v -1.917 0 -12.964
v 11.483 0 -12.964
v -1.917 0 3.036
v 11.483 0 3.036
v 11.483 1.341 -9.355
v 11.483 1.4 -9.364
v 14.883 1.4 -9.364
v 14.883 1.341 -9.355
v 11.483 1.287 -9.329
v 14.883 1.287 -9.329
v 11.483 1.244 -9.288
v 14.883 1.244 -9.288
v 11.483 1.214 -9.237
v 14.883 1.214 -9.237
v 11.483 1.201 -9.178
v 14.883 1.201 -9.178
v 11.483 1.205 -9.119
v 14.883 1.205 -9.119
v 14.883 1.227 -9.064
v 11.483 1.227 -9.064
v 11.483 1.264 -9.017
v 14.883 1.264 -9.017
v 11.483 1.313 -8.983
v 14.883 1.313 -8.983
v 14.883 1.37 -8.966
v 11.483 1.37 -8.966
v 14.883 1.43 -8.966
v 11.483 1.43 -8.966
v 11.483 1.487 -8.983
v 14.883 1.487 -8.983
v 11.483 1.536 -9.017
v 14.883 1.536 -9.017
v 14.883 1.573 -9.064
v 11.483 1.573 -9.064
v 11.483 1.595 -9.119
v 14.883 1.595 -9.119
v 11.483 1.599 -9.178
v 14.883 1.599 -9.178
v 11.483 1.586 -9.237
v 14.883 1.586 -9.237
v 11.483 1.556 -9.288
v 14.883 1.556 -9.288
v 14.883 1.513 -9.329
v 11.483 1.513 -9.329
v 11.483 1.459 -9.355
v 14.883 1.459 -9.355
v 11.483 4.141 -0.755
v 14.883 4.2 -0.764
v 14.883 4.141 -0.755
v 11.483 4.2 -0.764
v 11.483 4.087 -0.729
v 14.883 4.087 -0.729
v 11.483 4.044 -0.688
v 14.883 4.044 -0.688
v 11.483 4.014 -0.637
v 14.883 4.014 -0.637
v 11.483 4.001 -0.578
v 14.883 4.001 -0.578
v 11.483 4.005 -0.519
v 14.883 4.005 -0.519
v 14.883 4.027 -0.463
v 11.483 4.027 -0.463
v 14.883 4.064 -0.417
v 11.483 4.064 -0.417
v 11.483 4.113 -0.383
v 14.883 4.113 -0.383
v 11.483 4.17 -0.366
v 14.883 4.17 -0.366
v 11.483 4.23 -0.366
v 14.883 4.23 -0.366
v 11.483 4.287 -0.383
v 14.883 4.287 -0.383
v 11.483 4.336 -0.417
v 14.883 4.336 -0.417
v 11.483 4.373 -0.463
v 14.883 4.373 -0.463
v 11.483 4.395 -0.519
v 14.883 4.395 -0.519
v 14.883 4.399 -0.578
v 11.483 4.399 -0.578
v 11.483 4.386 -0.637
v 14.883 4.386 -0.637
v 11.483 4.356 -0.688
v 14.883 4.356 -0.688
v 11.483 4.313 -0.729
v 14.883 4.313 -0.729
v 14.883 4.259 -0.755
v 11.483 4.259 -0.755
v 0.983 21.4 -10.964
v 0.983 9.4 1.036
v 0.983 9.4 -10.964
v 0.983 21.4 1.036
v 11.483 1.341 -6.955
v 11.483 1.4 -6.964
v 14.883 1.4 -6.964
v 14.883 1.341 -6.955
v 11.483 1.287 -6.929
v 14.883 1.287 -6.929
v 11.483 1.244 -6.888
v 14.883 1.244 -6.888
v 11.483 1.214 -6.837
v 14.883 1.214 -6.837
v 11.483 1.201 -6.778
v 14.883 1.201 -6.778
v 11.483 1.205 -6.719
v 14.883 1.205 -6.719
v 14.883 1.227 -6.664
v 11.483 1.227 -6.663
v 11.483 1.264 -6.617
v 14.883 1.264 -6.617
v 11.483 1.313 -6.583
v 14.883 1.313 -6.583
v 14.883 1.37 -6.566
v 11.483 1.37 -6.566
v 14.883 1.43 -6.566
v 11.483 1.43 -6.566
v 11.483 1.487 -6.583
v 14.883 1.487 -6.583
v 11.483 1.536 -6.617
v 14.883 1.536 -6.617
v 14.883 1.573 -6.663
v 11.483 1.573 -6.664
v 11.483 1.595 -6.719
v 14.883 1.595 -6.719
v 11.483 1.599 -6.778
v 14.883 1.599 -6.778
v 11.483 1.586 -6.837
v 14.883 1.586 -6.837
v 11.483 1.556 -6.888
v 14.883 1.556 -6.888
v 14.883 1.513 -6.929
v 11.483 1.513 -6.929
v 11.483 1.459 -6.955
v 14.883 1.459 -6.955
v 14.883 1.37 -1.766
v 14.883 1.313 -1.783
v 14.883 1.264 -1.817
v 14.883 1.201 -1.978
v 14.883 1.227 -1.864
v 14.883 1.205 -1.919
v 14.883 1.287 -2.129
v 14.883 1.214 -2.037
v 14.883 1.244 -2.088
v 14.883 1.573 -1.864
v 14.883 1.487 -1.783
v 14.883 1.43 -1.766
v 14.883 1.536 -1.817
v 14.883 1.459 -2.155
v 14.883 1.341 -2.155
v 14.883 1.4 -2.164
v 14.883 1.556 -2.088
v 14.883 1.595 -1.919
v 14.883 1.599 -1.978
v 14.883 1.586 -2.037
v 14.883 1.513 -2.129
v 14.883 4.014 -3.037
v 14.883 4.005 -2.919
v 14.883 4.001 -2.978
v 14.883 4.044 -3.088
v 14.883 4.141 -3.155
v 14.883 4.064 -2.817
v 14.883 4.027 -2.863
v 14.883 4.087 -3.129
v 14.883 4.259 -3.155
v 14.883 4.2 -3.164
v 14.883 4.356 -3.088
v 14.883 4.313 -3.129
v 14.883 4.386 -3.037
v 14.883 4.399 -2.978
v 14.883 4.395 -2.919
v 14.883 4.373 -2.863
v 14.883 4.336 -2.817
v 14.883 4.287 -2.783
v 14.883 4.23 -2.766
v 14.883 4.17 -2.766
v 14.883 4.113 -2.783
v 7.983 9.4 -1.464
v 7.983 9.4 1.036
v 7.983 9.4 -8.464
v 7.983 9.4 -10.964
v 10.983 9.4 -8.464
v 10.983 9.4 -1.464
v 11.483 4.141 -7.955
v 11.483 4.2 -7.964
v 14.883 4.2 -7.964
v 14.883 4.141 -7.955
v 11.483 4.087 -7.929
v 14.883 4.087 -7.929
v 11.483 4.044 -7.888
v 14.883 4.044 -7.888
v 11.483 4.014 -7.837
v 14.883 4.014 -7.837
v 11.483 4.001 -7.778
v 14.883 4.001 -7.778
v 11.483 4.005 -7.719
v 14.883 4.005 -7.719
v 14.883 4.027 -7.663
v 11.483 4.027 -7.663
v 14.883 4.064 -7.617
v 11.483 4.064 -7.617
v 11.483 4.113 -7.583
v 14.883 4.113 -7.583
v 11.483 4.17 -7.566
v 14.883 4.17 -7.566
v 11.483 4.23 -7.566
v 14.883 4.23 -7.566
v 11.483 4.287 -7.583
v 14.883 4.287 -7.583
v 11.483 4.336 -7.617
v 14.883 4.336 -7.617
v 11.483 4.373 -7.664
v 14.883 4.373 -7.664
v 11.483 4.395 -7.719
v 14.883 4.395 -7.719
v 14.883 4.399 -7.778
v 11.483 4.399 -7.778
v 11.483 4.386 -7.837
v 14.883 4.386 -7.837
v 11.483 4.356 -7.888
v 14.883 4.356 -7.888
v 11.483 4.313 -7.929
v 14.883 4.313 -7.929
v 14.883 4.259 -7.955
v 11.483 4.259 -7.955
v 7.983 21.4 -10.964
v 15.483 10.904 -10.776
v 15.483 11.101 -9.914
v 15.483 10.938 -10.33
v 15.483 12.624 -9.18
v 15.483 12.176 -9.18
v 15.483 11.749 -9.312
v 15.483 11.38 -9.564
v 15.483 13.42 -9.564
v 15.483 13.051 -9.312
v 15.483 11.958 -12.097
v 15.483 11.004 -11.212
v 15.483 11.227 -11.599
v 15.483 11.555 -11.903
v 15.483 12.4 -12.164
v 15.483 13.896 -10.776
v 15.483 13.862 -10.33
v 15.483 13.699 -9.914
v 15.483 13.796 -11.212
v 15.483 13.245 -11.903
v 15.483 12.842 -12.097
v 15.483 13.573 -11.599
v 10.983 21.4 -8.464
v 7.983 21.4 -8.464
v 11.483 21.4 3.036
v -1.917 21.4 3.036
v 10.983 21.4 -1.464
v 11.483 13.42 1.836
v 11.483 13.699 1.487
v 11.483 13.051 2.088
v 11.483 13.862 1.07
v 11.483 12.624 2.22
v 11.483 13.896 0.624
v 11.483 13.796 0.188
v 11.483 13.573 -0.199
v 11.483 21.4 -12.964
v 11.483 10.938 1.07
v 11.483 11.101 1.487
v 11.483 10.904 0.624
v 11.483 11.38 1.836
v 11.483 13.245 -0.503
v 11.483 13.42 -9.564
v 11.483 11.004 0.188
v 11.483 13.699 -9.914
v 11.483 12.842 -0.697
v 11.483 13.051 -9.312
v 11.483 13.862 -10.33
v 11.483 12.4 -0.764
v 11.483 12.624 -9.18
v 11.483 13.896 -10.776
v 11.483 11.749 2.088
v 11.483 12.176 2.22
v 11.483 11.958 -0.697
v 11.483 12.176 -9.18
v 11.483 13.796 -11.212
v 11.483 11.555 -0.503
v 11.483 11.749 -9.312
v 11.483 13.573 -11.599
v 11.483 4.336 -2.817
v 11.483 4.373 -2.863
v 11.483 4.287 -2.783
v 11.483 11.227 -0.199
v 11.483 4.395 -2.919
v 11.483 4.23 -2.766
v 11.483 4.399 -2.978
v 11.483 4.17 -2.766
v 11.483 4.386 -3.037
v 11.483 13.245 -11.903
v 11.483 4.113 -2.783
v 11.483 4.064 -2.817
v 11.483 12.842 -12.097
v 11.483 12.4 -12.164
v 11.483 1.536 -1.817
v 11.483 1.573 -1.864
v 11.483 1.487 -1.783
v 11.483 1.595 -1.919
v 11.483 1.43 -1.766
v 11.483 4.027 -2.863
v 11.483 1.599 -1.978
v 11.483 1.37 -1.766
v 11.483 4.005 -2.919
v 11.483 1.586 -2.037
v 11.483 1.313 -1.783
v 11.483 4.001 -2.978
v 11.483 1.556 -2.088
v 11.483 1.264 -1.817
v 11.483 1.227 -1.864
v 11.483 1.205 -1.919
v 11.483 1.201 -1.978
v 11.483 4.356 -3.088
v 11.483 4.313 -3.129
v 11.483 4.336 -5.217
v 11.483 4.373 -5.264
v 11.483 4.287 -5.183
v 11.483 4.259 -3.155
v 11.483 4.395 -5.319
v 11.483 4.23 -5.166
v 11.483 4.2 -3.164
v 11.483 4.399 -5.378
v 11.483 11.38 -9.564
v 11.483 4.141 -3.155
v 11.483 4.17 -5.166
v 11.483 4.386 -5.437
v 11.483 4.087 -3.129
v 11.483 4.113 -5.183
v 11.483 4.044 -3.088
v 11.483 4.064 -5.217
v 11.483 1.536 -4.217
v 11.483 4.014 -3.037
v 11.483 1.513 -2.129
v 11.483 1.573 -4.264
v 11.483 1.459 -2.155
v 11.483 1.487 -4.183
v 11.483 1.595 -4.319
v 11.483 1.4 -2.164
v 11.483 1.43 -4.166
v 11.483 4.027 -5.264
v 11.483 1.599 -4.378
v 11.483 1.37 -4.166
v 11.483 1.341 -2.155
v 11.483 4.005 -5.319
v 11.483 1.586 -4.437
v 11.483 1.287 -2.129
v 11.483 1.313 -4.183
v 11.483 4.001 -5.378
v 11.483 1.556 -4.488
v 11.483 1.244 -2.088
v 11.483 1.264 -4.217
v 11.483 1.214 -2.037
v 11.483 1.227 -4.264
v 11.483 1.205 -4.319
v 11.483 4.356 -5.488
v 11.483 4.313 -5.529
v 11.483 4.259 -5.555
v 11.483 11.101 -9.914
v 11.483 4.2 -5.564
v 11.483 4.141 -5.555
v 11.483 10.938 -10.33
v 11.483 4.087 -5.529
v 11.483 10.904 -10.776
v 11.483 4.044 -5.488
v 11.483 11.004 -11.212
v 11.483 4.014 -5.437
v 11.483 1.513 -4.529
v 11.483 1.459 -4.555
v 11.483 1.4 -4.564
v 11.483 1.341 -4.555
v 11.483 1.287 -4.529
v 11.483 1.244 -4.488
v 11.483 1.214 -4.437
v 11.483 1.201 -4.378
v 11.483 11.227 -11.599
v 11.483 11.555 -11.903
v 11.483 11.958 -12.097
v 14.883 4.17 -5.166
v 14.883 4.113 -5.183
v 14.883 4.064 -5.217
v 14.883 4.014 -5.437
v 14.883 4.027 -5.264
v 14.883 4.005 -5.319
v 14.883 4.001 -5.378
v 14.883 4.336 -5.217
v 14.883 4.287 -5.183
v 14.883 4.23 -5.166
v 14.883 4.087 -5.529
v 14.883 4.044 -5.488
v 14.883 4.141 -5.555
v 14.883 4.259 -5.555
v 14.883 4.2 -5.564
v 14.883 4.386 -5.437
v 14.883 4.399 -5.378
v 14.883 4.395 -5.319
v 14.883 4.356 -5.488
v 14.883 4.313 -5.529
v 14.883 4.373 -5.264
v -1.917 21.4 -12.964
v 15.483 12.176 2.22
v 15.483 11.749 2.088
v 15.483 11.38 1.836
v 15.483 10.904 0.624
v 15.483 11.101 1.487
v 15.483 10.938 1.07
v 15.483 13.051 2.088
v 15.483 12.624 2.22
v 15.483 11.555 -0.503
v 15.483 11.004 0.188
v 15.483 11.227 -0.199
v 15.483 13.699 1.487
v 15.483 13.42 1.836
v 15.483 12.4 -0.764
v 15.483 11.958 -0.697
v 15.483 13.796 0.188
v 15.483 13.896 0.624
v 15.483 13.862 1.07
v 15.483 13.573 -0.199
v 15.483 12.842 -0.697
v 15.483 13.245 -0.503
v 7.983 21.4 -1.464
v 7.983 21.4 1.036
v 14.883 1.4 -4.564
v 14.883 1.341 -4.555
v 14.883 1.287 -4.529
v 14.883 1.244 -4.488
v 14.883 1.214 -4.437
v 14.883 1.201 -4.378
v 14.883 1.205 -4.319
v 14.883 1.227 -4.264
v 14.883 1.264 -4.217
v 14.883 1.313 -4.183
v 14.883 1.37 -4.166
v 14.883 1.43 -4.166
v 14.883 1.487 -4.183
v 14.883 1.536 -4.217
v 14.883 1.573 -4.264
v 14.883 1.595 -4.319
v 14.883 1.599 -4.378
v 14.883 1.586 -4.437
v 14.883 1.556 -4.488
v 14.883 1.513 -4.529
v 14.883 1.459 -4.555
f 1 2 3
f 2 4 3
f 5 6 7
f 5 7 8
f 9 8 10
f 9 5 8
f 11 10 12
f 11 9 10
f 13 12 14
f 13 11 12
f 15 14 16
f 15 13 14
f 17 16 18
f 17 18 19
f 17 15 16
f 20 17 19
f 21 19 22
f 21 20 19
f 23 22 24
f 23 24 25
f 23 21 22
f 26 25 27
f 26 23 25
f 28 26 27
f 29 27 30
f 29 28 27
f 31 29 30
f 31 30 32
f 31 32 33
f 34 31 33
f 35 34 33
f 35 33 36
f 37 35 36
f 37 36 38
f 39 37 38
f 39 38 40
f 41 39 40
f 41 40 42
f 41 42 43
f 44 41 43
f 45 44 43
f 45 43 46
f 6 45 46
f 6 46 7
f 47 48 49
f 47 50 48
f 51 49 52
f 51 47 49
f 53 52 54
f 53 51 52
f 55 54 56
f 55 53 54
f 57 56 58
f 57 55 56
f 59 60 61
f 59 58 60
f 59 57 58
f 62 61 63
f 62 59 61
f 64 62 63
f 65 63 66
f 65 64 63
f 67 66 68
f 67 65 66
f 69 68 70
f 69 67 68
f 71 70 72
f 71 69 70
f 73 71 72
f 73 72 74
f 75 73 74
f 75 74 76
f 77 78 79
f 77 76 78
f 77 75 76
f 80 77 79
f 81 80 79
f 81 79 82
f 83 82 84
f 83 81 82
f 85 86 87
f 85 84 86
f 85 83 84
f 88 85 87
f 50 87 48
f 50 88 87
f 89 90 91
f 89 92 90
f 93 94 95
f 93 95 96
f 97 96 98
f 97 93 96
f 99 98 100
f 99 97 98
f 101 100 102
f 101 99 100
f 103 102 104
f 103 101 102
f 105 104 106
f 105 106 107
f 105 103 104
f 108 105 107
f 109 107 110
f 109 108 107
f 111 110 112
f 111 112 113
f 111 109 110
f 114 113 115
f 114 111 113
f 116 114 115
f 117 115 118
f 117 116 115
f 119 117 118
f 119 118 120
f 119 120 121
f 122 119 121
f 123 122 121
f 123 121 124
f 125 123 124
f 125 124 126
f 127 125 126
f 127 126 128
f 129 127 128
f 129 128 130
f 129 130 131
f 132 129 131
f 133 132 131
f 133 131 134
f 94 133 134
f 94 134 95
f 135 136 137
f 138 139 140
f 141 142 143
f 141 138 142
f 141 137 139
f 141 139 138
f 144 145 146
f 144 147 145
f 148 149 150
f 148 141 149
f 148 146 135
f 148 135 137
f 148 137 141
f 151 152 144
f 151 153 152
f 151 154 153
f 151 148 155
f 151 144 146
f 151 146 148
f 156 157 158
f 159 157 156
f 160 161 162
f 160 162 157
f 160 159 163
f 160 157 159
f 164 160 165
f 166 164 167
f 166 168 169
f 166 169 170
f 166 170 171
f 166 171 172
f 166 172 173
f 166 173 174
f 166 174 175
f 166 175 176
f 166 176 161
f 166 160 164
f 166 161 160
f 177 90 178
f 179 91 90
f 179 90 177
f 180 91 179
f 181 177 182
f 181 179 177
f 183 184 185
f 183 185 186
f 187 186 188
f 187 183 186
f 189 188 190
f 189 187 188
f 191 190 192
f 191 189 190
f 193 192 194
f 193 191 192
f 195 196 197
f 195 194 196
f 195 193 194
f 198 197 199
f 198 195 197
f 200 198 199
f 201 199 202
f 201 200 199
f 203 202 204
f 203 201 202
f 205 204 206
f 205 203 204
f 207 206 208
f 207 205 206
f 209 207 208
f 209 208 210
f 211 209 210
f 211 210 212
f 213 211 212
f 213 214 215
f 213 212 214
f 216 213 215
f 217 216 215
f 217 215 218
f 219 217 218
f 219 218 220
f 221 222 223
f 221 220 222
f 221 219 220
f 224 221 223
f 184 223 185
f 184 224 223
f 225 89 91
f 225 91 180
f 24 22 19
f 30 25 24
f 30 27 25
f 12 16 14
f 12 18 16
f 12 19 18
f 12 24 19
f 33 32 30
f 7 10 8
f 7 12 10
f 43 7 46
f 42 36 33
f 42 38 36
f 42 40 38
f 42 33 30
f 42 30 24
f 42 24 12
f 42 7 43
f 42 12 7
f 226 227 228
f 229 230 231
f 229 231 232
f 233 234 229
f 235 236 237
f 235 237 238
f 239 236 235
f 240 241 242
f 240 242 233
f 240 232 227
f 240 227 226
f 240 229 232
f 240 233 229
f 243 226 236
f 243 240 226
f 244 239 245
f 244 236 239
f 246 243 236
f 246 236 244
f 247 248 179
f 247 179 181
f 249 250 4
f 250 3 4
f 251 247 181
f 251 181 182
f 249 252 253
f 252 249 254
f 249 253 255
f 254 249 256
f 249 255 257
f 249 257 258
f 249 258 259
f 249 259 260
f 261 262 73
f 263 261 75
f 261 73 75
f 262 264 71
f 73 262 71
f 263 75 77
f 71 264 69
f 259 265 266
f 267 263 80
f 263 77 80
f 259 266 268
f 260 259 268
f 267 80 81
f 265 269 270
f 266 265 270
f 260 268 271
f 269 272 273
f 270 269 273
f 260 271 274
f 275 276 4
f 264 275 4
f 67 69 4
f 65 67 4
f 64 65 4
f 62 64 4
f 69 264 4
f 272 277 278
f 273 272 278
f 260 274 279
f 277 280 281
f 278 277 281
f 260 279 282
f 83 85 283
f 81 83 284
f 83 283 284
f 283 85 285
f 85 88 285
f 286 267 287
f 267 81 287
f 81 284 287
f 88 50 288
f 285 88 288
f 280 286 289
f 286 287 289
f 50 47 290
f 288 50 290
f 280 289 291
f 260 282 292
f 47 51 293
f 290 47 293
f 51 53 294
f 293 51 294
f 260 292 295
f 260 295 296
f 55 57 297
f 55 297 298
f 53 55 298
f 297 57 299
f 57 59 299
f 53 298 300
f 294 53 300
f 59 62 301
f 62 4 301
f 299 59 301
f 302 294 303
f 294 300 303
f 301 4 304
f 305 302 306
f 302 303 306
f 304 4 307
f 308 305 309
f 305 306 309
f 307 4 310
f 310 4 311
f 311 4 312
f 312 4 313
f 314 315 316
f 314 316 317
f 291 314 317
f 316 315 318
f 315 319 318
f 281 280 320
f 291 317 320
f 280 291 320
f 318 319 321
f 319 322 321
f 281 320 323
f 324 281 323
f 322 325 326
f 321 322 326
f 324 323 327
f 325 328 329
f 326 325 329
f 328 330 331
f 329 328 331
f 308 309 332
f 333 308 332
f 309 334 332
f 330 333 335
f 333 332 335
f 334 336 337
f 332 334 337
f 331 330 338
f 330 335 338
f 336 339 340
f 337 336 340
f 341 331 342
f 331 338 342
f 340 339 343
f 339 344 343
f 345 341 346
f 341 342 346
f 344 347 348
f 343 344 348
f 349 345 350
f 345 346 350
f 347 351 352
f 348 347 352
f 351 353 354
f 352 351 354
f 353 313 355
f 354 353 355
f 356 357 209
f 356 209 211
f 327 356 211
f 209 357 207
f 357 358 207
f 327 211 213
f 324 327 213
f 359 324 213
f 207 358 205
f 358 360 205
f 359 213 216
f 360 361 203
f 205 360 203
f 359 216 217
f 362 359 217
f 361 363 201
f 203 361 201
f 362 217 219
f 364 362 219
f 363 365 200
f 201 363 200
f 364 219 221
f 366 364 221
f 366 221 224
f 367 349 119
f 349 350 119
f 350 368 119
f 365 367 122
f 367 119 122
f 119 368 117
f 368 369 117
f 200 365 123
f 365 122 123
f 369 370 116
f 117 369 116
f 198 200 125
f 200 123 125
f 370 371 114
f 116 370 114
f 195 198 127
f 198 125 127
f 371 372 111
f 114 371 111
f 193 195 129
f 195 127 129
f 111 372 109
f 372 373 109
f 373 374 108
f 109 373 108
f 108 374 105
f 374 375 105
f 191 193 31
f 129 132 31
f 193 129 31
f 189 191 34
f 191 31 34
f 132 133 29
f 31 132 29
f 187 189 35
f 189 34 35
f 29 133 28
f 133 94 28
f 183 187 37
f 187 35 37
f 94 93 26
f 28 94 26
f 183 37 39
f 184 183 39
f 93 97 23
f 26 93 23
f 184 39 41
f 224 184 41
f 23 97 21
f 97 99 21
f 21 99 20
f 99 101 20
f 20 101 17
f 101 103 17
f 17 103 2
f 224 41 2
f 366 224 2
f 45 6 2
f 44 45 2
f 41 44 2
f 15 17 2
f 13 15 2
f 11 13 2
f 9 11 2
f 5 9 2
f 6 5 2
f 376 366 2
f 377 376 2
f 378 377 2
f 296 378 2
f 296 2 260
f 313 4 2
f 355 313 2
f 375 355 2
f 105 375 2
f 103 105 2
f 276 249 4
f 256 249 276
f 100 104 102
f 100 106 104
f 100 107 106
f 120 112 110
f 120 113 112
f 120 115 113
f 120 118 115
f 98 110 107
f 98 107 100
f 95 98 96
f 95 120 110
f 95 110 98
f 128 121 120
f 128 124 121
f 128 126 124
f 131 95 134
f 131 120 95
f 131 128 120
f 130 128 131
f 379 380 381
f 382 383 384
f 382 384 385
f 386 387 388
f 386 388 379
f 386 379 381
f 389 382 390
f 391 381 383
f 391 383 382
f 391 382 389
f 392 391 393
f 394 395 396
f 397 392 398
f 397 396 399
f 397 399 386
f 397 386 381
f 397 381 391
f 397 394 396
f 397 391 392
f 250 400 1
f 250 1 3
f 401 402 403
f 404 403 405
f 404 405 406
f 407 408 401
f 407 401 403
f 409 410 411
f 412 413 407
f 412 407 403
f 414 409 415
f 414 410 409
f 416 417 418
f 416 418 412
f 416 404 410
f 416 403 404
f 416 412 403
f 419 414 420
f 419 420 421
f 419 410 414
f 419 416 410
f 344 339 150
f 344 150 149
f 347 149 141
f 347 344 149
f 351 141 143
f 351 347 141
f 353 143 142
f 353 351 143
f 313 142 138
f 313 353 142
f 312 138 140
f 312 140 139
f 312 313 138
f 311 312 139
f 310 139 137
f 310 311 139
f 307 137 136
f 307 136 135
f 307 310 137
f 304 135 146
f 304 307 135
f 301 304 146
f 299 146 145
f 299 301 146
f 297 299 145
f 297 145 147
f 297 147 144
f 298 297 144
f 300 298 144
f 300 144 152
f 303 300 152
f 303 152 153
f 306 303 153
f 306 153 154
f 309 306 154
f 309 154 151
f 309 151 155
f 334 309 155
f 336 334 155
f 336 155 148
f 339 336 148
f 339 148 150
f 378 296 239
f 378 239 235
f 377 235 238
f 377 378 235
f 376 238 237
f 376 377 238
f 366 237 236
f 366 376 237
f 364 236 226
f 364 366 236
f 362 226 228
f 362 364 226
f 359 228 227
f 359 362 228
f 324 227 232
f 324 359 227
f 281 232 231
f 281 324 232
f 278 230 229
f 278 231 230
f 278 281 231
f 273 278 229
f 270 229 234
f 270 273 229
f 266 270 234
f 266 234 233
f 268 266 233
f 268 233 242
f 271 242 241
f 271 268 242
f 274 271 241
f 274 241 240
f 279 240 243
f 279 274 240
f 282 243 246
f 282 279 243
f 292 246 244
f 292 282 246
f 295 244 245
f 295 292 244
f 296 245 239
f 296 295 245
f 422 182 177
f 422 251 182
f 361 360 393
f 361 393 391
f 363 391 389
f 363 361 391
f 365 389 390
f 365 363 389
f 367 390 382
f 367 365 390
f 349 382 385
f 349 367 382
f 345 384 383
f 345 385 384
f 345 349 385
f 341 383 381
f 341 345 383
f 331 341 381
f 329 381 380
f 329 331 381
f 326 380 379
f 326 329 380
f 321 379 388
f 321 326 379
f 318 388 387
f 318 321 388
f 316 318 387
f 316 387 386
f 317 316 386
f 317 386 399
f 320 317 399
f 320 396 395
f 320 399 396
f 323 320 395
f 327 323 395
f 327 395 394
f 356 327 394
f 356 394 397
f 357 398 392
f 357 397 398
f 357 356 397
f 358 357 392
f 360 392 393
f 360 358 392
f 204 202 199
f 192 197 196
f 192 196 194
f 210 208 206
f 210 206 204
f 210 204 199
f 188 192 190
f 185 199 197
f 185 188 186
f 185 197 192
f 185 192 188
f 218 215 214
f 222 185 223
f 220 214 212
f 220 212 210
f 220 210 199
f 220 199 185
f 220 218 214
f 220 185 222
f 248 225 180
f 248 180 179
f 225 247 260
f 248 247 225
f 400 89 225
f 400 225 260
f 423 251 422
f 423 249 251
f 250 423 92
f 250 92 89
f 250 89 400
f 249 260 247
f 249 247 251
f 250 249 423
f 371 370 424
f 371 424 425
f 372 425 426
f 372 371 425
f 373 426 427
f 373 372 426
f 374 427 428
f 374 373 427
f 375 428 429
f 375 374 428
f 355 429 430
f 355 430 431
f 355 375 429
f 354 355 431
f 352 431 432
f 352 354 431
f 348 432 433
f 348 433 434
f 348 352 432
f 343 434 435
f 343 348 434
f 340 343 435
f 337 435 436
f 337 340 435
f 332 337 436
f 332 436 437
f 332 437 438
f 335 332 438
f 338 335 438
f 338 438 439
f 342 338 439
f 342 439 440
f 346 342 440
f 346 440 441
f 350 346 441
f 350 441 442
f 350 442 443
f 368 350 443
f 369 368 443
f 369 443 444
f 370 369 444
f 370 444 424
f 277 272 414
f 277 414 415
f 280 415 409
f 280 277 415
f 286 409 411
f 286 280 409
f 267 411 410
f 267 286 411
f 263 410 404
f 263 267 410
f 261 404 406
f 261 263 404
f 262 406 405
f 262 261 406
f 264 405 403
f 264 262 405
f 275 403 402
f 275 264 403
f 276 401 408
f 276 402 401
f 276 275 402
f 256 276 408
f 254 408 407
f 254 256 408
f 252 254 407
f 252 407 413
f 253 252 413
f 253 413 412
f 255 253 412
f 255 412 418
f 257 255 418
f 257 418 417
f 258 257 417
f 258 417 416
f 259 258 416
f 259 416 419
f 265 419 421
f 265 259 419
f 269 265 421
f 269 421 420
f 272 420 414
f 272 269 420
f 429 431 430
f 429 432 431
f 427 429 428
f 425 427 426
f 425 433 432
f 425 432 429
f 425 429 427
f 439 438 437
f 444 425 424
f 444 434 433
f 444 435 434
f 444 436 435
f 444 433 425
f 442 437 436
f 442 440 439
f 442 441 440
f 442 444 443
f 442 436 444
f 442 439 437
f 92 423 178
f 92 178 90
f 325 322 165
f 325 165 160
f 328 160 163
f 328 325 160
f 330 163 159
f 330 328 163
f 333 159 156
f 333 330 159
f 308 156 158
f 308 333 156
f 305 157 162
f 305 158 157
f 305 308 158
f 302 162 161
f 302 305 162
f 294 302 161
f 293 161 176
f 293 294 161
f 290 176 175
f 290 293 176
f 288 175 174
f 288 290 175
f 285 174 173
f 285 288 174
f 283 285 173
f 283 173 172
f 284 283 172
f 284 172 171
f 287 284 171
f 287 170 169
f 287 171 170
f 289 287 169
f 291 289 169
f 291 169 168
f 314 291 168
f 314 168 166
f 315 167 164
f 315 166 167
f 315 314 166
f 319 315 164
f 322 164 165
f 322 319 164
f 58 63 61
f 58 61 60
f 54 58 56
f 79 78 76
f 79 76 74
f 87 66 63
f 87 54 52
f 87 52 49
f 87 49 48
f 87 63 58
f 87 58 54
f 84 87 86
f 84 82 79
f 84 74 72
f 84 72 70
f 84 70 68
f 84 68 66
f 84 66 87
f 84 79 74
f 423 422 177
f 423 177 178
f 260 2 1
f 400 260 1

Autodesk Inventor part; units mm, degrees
ref_plane "YZ Plane" through (0, 0, 0) normal (1, 0, 0) x (0, 1, 0)
ref_plane "XZ Plane" through (0, 0, 0) normal (0, 1, 0) x (-1, 0, 0)
ref_plane "XY Plane" through (0, 0, 0) normal (0, 0, 1) x (1, 0, 0)
sketch "Sketch1" plane through (0, 0, 0) normal (0, 1, 0) x (-1, 0, 0)
  line L0 (1.9169, 3.0365) -> (-11.4831, 3.0365)
  line L1 (-11.4831, 3.0365) -> (-11.4831, -12.9635)
  line L2 (-11.4831, -12.9635) -> (1.9169, -12.9635)
  line L3 (1.9169, -12.9635) -> (1.9169, 3.0365)
  point P0 (0, 0)
  dimension "d0" = 13.4
  dimension "d1" = 16
extrude "Extrusion1" add sketch "Sketch1" along normal blind 21.4
sketch "Sketch2" plane through (0, 21.4, 0) normal (0, 1, 0) x (1, 0, 0)
  line L0 (0.9831, -1.0365) -> (0.9831, 10.9635)
  line L1 (11.4831, 12.9635) -> (-1.9169, 12.9635) projected
  line L2 (0.9831, 10.9635) -> (7.9831, 10.9635)
  line L3 (7.9831, 10.9635) -> (7.9831, 8.4635)
  line L4 (7.9831, 8.4635) -> (10.9831, 8.4635)
  line L5 (10.9831, 8.4635) -> (10.9831, 1.4635)
  line L6 (10.9831, 1.4635) -> (7.9831, 1.4635)
  line L7 (7.9831, 1.4635) -> (7.9831, -1.0365)
  line L8 (7.9831, -1.0365) -> (0.9831, -1.0365)
  line L9 (-1.9169, -3.0365) -> (11.4831, -3.0365) projected
  line L10 (-1.9169, 12.9635) -> (-1.9169, -3.0365) projected
  point P0 (0, 0)
  dimension "d4" = 12
  dimension "d5" = 7
  dimension "d6" = 7
  dimension "d7" = 3
  dimension "d8" = 7
  dimension "d9" = 2.5
  dimension "d10" = 2.5
  dimension "d11" = 2
  dimension "d12" = 2
  dimension "d13" = 2.9
extrude "Extrusion2" cut sketch "Sketch2" against normal blind 12
sketch "Sketch3" plane through (11.4831, 0, 3.0365) normal (1, 0, 0) x (0, 0, -1)
  circle A0 centre (13.7, 12.4) radius 1.5
  circle A1 centre (2.3, 12.4) radius 1.5
  line L0 (0, 21.4) -> (16, 21.4) projected
  line L1 (0, 0) -> (0, 21.4) projected
  line L2 (16, 0) -> (16, 21.4) projected
  point P0 (3.0365, 0)
  dimension "d16" = 3
  dimension "d17" = 3
  dimension "d18" = 9
  dimension "d19" = 9
  dimension "d20" = 2.3
  dimension "d21" = 2.3
extrude "Extrusion3" add sketch "Sketch3" along normal blind 4
sketch "Sketch4" plane through (11.4831, 0, 3.0365) normal (1, 0, 0) x (0, 0, -1)
  circle A0 centre (3.6, 4.2) radius 0.2
  circle A1 centre (6, 4.2) radius 0.2
  line L0 (0, 0) -> (0, 21.4) projected
  circle A2 centre (8.4, 4.2) radius 0.2
  circle A3 centre (10.8, 4.2) radius 0.2
  line L1 (0, 0) -> (16, 0) projected
  line L2 (0.3816, 1.4) -> (15.1957, 1.4)
  circle A4 centre (5, 1.4) radius 0.2
  circle A5 centre (7.4, 1.4) radius 0.2
  circle A6 centre (9.8, 1.4) radius 0.2
  circle A7 centre (12.2, 1.4) radius 0.2
  point P0 (3.0365, 0)
  dimension "d24" = 0.4
  dimension "d25" = 0.4
  dimension "d26" = 3.6
  dimension "d27" = 2.4
  dimension "d28" = 0.4
  dimension "d29" = 0.4
  dimension "d30" = 2.4
  dimension "d31" = 2.4
  dimension "d32" = 0
  dimension "d33" = 0
  dimension "d34" = 0
  dimension "d35" = 4.2
  dimension "d36" = 1.4
  dimension "d37" = 0.4
  dimension "d38" = 0.4
  dimension "d39" = 0.4
  dimension "d40" = 0.4
  dimension "d41" = 1.4
  dimension "d42" = 2.4
  dimension "d43" = 2.4
  dimension "d44" = 2.4
extrude "Extrusion4" add sketch "Sketch4" along normal blind 3.4
equation "\"d21\" = d20"
properties part number "rj45"
